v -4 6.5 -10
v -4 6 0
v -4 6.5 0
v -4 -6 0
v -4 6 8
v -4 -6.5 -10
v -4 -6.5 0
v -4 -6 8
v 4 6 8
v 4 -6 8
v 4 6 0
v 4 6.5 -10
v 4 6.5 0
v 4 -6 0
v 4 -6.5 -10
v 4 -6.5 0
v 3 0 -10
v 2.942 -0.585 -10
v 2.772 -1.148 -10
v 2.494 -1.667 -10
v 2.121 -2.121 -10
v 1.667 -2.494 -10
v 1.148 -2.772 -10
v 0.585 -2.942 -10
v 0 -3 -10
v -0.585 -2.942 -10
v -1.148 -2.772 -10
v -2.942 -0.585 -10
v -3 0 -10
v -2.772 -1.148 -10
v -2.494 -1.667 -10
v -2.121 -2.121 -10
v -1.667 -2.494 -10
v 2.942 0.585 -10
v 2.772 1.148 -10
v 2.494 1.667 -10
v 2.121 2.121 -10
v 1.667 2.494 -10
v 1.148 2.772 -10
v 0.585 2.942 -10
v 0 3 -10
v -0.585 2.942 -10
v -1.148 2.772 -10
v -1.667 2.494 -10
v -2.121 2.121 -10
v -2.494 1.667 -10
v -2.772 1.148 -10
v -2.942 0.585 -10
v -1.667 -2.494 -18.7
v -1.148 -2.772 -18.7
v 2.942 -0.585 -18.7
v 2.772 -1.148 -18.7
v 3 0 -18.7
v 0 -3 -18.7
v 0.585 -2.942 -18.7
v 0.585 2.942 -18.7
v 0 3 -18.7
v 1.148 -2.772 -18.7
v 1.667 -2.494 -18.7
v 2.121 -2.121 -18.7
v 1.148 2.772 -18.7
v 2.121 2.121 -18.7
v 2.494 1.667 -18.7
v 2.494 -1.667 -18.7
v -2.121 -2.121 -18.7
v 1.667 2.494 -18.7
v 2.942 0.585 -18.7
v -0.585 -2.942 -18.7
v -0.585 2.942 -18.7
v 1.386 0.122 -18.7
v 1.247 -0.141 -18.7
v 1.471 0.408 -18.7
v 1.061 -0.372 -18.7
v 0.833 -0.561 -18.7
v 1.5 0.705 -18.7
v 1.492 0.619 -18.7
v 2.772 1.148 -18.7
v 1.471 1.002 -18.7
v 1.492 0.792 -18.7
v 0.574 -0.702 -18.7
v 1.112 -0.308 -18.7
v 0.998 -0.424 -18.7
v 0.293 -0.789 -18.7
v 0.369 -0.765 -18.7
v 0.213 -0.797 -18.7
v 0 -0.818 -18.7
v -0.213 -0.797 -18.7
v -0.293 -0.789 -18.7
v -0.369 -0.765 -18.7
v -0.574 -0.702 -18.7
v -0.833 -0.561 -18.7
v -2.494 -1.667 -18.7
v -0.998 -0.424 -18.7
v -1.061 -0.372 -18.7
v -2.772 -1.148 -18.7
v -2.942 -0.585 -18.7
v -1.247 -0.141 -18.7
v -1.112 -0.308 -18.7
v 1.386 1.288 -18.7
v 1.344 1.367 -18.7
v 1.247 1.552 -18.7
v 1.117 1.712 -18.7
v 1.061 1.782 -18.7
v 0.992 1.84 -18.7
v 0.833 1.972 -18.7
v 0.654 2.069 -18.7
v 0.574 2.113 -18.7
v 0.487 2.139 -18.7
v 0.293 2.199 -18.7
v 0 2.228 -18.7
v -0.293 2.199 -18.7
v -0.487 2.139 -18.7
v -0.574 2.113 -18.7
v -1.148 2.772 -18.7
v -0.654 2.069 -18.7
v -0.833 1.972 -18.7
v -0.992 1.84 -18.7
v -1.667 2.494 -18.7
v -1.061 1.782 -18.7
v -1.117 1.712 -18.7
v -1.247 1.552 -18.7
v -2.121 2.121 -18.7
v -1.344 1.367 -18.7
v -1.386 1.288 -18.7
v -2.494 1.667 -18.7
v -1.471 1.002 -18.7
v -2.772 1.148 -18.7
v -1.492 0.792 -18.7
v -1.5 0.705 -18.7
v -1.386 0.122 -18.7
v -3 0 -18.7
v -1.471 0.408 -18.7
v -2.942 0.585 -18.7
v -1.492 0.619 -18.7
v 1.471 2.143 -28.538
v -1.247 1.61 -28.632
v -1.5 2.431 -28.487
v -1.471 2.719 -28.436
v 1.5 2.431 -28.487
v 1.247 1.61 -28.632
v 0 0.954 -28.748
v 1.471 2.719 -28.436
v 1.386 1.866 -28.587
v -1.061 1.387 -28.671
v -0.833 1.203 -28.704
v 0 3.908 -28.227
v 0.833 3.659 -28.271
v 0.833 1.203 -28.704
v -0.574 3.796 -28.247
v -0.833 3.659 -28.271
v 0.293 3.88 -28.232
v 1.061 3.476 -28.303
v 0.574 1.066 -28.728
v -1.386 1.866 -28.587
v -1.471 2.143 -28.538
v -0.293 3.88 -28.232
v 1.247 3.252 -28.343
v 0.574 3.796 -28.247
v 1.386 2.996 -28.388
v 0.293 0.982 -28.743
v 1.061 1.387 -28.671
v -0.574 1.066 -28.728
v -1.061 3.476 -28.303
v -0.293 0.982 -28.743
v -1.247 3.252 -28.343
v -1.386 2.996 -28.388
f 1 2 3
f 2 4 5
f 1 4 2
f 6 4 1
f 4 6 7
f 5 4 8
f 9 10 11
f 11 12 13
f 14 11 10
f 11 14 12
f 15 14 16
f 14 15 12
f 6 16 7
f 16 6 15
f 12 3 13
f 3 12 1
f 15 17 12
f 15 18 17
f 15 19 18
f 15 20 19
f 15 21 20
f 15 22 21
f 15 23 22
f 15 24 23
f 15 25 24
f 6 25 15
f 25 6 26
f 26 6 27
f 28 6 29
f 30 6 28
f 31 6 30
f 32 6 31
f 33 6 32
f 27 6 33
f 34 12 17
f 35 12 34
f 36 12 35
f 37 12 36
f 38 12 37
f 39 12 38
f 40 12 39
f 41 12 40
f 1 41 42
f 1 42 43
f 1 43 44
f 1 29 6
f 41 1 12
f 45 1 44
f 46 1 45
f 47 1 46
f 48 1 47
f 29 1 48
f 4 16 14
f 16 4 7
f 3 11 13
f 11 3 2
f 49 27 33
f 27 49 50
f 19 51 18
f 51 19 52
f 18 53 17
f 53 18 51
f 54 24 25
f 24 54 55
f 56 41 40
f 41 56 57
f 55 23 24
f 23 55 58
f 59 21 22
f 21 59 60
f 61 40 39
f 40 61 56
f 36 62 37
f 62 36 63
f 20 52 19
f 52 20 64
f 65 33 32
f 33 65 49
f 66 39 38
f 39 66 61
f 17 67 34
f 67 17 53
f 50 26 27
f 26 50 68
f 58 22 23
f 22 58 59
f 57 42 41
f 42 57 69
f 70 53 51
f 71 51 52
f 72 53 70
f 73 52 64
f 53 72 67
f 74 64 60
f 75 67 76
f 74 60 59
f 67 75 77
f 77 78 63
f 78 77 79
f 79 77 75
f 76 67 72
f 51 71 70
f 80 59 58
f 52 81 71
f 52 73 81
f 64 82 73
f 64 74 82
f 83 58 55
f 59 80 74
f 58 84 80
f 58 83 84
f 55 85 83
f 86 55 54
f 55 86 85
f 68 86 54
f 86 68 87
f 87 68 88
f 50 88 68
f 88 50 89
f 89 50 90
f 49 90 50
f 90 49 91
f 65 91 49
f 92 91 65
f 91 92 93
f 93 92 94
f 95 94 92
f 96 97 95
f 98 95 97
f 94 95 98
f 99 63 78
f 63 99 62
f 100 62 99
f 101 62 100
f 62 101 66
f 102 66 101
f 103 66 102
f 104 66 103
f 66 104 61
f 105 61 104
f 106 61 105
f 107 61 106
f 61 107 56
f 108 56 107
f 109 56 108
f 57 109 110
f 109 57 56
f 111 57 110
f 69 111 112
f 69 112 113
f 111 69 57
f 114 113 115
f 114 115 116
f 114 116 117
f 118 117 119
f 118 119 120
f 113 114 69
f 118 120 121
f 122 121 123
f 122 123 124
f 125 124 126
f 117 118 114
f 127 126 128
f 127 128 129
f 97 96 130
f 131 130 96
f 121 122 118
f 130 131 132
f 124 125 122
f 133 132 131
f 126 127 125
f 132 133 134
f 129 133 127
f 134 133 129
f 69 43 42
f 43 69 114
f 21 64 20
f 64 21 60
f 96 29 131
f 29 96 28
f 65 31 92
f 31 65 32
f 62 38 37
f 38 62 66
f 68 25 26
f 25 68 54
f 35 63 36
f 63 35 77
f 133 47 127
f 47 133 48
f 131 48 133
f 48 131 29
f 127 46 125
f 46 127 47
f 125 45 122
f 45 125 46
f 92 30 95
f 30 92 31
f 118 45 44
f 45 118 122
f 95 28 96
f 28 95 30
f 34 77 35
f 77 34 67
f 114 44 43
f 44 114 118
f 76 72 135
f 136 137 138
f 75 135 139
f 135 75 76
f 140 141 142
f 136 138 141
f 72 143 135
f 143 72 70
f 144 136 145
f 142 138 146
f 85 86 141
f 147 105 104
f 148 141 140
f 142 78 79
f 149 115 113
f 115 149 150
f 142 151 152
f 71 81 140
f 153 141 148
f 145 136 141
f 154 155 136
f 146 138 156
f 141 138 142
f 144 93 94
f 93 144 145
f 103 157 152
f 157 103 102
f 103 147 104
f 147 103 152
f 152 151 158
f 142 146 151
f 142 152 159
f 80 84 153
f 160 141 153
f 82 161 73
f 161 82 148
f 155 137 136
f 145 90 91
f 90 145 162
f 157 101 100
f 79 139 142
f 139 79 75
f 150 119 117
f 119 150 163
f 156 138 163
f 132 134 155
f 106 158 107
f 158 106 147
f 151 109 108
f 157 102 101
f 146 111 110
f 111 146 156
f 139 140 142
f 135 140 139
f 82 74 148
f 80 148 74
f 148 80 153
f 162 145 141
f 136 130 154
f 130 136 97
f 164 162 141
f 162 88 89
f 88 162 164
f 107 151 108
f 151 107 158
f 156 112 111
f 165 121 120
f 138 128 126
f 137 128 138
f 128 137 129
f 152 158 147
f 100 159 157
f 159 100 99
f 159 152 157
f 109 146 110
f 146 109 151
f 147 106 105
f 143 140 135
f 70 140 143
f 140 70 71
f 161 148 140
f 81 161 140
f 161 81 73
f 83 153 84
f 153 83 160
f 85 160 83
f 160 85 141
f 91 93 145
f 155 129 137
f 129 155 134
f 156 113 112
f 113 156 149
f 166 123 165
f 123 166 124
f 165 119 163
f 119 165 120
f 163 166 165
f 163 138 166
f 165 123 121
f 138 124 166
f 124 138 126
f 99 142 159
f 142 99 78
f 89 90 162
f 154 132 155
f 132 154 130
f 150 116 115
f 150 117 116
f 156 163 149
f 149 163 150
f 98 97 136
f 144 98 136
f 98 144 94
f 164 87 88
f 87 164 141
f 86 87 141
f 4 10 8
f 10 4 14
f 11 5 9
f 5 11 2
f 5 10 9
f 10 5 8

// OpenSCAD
// Start: lazy_union
default_5_default_5();
// End: lazy_union

// Modules.

// 'PartMaterial undef-default - default 5.0'
module default_5_default_5() {
  // 'None : _combine_solids_and_holes'
  union() {
    // 'default : _combine_solids_and_holes'
    union() {
      // 'case'
      multmatrix(m=[[1.0, 0.0, 0.0, -4.0], [-0.0, -0.0, -1.0, 6.5], [0.0, 1.0, 0.0, -10.0], [0.0, 0.0, 0.0, 1.0]]) {
        // 'case : _combine_solids_and_holes'
        union() {
          // 'case'
          cube(size=[8.0, 10.0, 13.0]);
        }
      }
      // 'shaft'
      multmatrix(m=[[1.0, 0.0, 0.0, 0.0], [0.0, -1.0, 0.0, 0.0], [0.0, 0.0, -1.0, -10.0], [0.0, 0.0, 0.0, 1.0]]) {
        // 'shaft : _combine_solids_and_holes'
        union() {
          // 'shaft'
          cylinder(h=8.7, r1=3.0, r2=3.0, center=false, $fn=32);
        }
      }
      // 'bat'
      multmatrix(m=[[1.0, 0.0, 0.0, 0.0], [0.0, -0.984807753012208, 0.17364817766693033, 0.0], [0.0, -0.17364817766693033, -0.984807753012208, -14.7], [0.0, 0.0, 0.0, 1.0]]) {
        // 'bat : _combine_solids_and_holes'
        union() {
          // 'bat'
          cylinder(h=14.0, r1=1.5, r2=1.5, center=false, $fn=32);
        }
      }
      // 'terminal_cavity'
      multmatrix(m=[[1.0, 0.0, 0.0, -4.0], [0.0, 0.0, -1.0, 6.0], [0.0, 1.0, 0.0, 0.0], [0.0, 0.0, 0.0, 1.0]]) {
        // 'terminal_cavity'
        color(c=[0.0, 0.0, 1.0, 0.5]) {
          // 'terminal_cavity : _combine_solids_and_holes'
          union() {
            // 'terminal_cavity'
            cube(size=[8.0, 8.0, 12.0]);
          }
        }
      }
    }
  }
} // end module default_5_default_5
